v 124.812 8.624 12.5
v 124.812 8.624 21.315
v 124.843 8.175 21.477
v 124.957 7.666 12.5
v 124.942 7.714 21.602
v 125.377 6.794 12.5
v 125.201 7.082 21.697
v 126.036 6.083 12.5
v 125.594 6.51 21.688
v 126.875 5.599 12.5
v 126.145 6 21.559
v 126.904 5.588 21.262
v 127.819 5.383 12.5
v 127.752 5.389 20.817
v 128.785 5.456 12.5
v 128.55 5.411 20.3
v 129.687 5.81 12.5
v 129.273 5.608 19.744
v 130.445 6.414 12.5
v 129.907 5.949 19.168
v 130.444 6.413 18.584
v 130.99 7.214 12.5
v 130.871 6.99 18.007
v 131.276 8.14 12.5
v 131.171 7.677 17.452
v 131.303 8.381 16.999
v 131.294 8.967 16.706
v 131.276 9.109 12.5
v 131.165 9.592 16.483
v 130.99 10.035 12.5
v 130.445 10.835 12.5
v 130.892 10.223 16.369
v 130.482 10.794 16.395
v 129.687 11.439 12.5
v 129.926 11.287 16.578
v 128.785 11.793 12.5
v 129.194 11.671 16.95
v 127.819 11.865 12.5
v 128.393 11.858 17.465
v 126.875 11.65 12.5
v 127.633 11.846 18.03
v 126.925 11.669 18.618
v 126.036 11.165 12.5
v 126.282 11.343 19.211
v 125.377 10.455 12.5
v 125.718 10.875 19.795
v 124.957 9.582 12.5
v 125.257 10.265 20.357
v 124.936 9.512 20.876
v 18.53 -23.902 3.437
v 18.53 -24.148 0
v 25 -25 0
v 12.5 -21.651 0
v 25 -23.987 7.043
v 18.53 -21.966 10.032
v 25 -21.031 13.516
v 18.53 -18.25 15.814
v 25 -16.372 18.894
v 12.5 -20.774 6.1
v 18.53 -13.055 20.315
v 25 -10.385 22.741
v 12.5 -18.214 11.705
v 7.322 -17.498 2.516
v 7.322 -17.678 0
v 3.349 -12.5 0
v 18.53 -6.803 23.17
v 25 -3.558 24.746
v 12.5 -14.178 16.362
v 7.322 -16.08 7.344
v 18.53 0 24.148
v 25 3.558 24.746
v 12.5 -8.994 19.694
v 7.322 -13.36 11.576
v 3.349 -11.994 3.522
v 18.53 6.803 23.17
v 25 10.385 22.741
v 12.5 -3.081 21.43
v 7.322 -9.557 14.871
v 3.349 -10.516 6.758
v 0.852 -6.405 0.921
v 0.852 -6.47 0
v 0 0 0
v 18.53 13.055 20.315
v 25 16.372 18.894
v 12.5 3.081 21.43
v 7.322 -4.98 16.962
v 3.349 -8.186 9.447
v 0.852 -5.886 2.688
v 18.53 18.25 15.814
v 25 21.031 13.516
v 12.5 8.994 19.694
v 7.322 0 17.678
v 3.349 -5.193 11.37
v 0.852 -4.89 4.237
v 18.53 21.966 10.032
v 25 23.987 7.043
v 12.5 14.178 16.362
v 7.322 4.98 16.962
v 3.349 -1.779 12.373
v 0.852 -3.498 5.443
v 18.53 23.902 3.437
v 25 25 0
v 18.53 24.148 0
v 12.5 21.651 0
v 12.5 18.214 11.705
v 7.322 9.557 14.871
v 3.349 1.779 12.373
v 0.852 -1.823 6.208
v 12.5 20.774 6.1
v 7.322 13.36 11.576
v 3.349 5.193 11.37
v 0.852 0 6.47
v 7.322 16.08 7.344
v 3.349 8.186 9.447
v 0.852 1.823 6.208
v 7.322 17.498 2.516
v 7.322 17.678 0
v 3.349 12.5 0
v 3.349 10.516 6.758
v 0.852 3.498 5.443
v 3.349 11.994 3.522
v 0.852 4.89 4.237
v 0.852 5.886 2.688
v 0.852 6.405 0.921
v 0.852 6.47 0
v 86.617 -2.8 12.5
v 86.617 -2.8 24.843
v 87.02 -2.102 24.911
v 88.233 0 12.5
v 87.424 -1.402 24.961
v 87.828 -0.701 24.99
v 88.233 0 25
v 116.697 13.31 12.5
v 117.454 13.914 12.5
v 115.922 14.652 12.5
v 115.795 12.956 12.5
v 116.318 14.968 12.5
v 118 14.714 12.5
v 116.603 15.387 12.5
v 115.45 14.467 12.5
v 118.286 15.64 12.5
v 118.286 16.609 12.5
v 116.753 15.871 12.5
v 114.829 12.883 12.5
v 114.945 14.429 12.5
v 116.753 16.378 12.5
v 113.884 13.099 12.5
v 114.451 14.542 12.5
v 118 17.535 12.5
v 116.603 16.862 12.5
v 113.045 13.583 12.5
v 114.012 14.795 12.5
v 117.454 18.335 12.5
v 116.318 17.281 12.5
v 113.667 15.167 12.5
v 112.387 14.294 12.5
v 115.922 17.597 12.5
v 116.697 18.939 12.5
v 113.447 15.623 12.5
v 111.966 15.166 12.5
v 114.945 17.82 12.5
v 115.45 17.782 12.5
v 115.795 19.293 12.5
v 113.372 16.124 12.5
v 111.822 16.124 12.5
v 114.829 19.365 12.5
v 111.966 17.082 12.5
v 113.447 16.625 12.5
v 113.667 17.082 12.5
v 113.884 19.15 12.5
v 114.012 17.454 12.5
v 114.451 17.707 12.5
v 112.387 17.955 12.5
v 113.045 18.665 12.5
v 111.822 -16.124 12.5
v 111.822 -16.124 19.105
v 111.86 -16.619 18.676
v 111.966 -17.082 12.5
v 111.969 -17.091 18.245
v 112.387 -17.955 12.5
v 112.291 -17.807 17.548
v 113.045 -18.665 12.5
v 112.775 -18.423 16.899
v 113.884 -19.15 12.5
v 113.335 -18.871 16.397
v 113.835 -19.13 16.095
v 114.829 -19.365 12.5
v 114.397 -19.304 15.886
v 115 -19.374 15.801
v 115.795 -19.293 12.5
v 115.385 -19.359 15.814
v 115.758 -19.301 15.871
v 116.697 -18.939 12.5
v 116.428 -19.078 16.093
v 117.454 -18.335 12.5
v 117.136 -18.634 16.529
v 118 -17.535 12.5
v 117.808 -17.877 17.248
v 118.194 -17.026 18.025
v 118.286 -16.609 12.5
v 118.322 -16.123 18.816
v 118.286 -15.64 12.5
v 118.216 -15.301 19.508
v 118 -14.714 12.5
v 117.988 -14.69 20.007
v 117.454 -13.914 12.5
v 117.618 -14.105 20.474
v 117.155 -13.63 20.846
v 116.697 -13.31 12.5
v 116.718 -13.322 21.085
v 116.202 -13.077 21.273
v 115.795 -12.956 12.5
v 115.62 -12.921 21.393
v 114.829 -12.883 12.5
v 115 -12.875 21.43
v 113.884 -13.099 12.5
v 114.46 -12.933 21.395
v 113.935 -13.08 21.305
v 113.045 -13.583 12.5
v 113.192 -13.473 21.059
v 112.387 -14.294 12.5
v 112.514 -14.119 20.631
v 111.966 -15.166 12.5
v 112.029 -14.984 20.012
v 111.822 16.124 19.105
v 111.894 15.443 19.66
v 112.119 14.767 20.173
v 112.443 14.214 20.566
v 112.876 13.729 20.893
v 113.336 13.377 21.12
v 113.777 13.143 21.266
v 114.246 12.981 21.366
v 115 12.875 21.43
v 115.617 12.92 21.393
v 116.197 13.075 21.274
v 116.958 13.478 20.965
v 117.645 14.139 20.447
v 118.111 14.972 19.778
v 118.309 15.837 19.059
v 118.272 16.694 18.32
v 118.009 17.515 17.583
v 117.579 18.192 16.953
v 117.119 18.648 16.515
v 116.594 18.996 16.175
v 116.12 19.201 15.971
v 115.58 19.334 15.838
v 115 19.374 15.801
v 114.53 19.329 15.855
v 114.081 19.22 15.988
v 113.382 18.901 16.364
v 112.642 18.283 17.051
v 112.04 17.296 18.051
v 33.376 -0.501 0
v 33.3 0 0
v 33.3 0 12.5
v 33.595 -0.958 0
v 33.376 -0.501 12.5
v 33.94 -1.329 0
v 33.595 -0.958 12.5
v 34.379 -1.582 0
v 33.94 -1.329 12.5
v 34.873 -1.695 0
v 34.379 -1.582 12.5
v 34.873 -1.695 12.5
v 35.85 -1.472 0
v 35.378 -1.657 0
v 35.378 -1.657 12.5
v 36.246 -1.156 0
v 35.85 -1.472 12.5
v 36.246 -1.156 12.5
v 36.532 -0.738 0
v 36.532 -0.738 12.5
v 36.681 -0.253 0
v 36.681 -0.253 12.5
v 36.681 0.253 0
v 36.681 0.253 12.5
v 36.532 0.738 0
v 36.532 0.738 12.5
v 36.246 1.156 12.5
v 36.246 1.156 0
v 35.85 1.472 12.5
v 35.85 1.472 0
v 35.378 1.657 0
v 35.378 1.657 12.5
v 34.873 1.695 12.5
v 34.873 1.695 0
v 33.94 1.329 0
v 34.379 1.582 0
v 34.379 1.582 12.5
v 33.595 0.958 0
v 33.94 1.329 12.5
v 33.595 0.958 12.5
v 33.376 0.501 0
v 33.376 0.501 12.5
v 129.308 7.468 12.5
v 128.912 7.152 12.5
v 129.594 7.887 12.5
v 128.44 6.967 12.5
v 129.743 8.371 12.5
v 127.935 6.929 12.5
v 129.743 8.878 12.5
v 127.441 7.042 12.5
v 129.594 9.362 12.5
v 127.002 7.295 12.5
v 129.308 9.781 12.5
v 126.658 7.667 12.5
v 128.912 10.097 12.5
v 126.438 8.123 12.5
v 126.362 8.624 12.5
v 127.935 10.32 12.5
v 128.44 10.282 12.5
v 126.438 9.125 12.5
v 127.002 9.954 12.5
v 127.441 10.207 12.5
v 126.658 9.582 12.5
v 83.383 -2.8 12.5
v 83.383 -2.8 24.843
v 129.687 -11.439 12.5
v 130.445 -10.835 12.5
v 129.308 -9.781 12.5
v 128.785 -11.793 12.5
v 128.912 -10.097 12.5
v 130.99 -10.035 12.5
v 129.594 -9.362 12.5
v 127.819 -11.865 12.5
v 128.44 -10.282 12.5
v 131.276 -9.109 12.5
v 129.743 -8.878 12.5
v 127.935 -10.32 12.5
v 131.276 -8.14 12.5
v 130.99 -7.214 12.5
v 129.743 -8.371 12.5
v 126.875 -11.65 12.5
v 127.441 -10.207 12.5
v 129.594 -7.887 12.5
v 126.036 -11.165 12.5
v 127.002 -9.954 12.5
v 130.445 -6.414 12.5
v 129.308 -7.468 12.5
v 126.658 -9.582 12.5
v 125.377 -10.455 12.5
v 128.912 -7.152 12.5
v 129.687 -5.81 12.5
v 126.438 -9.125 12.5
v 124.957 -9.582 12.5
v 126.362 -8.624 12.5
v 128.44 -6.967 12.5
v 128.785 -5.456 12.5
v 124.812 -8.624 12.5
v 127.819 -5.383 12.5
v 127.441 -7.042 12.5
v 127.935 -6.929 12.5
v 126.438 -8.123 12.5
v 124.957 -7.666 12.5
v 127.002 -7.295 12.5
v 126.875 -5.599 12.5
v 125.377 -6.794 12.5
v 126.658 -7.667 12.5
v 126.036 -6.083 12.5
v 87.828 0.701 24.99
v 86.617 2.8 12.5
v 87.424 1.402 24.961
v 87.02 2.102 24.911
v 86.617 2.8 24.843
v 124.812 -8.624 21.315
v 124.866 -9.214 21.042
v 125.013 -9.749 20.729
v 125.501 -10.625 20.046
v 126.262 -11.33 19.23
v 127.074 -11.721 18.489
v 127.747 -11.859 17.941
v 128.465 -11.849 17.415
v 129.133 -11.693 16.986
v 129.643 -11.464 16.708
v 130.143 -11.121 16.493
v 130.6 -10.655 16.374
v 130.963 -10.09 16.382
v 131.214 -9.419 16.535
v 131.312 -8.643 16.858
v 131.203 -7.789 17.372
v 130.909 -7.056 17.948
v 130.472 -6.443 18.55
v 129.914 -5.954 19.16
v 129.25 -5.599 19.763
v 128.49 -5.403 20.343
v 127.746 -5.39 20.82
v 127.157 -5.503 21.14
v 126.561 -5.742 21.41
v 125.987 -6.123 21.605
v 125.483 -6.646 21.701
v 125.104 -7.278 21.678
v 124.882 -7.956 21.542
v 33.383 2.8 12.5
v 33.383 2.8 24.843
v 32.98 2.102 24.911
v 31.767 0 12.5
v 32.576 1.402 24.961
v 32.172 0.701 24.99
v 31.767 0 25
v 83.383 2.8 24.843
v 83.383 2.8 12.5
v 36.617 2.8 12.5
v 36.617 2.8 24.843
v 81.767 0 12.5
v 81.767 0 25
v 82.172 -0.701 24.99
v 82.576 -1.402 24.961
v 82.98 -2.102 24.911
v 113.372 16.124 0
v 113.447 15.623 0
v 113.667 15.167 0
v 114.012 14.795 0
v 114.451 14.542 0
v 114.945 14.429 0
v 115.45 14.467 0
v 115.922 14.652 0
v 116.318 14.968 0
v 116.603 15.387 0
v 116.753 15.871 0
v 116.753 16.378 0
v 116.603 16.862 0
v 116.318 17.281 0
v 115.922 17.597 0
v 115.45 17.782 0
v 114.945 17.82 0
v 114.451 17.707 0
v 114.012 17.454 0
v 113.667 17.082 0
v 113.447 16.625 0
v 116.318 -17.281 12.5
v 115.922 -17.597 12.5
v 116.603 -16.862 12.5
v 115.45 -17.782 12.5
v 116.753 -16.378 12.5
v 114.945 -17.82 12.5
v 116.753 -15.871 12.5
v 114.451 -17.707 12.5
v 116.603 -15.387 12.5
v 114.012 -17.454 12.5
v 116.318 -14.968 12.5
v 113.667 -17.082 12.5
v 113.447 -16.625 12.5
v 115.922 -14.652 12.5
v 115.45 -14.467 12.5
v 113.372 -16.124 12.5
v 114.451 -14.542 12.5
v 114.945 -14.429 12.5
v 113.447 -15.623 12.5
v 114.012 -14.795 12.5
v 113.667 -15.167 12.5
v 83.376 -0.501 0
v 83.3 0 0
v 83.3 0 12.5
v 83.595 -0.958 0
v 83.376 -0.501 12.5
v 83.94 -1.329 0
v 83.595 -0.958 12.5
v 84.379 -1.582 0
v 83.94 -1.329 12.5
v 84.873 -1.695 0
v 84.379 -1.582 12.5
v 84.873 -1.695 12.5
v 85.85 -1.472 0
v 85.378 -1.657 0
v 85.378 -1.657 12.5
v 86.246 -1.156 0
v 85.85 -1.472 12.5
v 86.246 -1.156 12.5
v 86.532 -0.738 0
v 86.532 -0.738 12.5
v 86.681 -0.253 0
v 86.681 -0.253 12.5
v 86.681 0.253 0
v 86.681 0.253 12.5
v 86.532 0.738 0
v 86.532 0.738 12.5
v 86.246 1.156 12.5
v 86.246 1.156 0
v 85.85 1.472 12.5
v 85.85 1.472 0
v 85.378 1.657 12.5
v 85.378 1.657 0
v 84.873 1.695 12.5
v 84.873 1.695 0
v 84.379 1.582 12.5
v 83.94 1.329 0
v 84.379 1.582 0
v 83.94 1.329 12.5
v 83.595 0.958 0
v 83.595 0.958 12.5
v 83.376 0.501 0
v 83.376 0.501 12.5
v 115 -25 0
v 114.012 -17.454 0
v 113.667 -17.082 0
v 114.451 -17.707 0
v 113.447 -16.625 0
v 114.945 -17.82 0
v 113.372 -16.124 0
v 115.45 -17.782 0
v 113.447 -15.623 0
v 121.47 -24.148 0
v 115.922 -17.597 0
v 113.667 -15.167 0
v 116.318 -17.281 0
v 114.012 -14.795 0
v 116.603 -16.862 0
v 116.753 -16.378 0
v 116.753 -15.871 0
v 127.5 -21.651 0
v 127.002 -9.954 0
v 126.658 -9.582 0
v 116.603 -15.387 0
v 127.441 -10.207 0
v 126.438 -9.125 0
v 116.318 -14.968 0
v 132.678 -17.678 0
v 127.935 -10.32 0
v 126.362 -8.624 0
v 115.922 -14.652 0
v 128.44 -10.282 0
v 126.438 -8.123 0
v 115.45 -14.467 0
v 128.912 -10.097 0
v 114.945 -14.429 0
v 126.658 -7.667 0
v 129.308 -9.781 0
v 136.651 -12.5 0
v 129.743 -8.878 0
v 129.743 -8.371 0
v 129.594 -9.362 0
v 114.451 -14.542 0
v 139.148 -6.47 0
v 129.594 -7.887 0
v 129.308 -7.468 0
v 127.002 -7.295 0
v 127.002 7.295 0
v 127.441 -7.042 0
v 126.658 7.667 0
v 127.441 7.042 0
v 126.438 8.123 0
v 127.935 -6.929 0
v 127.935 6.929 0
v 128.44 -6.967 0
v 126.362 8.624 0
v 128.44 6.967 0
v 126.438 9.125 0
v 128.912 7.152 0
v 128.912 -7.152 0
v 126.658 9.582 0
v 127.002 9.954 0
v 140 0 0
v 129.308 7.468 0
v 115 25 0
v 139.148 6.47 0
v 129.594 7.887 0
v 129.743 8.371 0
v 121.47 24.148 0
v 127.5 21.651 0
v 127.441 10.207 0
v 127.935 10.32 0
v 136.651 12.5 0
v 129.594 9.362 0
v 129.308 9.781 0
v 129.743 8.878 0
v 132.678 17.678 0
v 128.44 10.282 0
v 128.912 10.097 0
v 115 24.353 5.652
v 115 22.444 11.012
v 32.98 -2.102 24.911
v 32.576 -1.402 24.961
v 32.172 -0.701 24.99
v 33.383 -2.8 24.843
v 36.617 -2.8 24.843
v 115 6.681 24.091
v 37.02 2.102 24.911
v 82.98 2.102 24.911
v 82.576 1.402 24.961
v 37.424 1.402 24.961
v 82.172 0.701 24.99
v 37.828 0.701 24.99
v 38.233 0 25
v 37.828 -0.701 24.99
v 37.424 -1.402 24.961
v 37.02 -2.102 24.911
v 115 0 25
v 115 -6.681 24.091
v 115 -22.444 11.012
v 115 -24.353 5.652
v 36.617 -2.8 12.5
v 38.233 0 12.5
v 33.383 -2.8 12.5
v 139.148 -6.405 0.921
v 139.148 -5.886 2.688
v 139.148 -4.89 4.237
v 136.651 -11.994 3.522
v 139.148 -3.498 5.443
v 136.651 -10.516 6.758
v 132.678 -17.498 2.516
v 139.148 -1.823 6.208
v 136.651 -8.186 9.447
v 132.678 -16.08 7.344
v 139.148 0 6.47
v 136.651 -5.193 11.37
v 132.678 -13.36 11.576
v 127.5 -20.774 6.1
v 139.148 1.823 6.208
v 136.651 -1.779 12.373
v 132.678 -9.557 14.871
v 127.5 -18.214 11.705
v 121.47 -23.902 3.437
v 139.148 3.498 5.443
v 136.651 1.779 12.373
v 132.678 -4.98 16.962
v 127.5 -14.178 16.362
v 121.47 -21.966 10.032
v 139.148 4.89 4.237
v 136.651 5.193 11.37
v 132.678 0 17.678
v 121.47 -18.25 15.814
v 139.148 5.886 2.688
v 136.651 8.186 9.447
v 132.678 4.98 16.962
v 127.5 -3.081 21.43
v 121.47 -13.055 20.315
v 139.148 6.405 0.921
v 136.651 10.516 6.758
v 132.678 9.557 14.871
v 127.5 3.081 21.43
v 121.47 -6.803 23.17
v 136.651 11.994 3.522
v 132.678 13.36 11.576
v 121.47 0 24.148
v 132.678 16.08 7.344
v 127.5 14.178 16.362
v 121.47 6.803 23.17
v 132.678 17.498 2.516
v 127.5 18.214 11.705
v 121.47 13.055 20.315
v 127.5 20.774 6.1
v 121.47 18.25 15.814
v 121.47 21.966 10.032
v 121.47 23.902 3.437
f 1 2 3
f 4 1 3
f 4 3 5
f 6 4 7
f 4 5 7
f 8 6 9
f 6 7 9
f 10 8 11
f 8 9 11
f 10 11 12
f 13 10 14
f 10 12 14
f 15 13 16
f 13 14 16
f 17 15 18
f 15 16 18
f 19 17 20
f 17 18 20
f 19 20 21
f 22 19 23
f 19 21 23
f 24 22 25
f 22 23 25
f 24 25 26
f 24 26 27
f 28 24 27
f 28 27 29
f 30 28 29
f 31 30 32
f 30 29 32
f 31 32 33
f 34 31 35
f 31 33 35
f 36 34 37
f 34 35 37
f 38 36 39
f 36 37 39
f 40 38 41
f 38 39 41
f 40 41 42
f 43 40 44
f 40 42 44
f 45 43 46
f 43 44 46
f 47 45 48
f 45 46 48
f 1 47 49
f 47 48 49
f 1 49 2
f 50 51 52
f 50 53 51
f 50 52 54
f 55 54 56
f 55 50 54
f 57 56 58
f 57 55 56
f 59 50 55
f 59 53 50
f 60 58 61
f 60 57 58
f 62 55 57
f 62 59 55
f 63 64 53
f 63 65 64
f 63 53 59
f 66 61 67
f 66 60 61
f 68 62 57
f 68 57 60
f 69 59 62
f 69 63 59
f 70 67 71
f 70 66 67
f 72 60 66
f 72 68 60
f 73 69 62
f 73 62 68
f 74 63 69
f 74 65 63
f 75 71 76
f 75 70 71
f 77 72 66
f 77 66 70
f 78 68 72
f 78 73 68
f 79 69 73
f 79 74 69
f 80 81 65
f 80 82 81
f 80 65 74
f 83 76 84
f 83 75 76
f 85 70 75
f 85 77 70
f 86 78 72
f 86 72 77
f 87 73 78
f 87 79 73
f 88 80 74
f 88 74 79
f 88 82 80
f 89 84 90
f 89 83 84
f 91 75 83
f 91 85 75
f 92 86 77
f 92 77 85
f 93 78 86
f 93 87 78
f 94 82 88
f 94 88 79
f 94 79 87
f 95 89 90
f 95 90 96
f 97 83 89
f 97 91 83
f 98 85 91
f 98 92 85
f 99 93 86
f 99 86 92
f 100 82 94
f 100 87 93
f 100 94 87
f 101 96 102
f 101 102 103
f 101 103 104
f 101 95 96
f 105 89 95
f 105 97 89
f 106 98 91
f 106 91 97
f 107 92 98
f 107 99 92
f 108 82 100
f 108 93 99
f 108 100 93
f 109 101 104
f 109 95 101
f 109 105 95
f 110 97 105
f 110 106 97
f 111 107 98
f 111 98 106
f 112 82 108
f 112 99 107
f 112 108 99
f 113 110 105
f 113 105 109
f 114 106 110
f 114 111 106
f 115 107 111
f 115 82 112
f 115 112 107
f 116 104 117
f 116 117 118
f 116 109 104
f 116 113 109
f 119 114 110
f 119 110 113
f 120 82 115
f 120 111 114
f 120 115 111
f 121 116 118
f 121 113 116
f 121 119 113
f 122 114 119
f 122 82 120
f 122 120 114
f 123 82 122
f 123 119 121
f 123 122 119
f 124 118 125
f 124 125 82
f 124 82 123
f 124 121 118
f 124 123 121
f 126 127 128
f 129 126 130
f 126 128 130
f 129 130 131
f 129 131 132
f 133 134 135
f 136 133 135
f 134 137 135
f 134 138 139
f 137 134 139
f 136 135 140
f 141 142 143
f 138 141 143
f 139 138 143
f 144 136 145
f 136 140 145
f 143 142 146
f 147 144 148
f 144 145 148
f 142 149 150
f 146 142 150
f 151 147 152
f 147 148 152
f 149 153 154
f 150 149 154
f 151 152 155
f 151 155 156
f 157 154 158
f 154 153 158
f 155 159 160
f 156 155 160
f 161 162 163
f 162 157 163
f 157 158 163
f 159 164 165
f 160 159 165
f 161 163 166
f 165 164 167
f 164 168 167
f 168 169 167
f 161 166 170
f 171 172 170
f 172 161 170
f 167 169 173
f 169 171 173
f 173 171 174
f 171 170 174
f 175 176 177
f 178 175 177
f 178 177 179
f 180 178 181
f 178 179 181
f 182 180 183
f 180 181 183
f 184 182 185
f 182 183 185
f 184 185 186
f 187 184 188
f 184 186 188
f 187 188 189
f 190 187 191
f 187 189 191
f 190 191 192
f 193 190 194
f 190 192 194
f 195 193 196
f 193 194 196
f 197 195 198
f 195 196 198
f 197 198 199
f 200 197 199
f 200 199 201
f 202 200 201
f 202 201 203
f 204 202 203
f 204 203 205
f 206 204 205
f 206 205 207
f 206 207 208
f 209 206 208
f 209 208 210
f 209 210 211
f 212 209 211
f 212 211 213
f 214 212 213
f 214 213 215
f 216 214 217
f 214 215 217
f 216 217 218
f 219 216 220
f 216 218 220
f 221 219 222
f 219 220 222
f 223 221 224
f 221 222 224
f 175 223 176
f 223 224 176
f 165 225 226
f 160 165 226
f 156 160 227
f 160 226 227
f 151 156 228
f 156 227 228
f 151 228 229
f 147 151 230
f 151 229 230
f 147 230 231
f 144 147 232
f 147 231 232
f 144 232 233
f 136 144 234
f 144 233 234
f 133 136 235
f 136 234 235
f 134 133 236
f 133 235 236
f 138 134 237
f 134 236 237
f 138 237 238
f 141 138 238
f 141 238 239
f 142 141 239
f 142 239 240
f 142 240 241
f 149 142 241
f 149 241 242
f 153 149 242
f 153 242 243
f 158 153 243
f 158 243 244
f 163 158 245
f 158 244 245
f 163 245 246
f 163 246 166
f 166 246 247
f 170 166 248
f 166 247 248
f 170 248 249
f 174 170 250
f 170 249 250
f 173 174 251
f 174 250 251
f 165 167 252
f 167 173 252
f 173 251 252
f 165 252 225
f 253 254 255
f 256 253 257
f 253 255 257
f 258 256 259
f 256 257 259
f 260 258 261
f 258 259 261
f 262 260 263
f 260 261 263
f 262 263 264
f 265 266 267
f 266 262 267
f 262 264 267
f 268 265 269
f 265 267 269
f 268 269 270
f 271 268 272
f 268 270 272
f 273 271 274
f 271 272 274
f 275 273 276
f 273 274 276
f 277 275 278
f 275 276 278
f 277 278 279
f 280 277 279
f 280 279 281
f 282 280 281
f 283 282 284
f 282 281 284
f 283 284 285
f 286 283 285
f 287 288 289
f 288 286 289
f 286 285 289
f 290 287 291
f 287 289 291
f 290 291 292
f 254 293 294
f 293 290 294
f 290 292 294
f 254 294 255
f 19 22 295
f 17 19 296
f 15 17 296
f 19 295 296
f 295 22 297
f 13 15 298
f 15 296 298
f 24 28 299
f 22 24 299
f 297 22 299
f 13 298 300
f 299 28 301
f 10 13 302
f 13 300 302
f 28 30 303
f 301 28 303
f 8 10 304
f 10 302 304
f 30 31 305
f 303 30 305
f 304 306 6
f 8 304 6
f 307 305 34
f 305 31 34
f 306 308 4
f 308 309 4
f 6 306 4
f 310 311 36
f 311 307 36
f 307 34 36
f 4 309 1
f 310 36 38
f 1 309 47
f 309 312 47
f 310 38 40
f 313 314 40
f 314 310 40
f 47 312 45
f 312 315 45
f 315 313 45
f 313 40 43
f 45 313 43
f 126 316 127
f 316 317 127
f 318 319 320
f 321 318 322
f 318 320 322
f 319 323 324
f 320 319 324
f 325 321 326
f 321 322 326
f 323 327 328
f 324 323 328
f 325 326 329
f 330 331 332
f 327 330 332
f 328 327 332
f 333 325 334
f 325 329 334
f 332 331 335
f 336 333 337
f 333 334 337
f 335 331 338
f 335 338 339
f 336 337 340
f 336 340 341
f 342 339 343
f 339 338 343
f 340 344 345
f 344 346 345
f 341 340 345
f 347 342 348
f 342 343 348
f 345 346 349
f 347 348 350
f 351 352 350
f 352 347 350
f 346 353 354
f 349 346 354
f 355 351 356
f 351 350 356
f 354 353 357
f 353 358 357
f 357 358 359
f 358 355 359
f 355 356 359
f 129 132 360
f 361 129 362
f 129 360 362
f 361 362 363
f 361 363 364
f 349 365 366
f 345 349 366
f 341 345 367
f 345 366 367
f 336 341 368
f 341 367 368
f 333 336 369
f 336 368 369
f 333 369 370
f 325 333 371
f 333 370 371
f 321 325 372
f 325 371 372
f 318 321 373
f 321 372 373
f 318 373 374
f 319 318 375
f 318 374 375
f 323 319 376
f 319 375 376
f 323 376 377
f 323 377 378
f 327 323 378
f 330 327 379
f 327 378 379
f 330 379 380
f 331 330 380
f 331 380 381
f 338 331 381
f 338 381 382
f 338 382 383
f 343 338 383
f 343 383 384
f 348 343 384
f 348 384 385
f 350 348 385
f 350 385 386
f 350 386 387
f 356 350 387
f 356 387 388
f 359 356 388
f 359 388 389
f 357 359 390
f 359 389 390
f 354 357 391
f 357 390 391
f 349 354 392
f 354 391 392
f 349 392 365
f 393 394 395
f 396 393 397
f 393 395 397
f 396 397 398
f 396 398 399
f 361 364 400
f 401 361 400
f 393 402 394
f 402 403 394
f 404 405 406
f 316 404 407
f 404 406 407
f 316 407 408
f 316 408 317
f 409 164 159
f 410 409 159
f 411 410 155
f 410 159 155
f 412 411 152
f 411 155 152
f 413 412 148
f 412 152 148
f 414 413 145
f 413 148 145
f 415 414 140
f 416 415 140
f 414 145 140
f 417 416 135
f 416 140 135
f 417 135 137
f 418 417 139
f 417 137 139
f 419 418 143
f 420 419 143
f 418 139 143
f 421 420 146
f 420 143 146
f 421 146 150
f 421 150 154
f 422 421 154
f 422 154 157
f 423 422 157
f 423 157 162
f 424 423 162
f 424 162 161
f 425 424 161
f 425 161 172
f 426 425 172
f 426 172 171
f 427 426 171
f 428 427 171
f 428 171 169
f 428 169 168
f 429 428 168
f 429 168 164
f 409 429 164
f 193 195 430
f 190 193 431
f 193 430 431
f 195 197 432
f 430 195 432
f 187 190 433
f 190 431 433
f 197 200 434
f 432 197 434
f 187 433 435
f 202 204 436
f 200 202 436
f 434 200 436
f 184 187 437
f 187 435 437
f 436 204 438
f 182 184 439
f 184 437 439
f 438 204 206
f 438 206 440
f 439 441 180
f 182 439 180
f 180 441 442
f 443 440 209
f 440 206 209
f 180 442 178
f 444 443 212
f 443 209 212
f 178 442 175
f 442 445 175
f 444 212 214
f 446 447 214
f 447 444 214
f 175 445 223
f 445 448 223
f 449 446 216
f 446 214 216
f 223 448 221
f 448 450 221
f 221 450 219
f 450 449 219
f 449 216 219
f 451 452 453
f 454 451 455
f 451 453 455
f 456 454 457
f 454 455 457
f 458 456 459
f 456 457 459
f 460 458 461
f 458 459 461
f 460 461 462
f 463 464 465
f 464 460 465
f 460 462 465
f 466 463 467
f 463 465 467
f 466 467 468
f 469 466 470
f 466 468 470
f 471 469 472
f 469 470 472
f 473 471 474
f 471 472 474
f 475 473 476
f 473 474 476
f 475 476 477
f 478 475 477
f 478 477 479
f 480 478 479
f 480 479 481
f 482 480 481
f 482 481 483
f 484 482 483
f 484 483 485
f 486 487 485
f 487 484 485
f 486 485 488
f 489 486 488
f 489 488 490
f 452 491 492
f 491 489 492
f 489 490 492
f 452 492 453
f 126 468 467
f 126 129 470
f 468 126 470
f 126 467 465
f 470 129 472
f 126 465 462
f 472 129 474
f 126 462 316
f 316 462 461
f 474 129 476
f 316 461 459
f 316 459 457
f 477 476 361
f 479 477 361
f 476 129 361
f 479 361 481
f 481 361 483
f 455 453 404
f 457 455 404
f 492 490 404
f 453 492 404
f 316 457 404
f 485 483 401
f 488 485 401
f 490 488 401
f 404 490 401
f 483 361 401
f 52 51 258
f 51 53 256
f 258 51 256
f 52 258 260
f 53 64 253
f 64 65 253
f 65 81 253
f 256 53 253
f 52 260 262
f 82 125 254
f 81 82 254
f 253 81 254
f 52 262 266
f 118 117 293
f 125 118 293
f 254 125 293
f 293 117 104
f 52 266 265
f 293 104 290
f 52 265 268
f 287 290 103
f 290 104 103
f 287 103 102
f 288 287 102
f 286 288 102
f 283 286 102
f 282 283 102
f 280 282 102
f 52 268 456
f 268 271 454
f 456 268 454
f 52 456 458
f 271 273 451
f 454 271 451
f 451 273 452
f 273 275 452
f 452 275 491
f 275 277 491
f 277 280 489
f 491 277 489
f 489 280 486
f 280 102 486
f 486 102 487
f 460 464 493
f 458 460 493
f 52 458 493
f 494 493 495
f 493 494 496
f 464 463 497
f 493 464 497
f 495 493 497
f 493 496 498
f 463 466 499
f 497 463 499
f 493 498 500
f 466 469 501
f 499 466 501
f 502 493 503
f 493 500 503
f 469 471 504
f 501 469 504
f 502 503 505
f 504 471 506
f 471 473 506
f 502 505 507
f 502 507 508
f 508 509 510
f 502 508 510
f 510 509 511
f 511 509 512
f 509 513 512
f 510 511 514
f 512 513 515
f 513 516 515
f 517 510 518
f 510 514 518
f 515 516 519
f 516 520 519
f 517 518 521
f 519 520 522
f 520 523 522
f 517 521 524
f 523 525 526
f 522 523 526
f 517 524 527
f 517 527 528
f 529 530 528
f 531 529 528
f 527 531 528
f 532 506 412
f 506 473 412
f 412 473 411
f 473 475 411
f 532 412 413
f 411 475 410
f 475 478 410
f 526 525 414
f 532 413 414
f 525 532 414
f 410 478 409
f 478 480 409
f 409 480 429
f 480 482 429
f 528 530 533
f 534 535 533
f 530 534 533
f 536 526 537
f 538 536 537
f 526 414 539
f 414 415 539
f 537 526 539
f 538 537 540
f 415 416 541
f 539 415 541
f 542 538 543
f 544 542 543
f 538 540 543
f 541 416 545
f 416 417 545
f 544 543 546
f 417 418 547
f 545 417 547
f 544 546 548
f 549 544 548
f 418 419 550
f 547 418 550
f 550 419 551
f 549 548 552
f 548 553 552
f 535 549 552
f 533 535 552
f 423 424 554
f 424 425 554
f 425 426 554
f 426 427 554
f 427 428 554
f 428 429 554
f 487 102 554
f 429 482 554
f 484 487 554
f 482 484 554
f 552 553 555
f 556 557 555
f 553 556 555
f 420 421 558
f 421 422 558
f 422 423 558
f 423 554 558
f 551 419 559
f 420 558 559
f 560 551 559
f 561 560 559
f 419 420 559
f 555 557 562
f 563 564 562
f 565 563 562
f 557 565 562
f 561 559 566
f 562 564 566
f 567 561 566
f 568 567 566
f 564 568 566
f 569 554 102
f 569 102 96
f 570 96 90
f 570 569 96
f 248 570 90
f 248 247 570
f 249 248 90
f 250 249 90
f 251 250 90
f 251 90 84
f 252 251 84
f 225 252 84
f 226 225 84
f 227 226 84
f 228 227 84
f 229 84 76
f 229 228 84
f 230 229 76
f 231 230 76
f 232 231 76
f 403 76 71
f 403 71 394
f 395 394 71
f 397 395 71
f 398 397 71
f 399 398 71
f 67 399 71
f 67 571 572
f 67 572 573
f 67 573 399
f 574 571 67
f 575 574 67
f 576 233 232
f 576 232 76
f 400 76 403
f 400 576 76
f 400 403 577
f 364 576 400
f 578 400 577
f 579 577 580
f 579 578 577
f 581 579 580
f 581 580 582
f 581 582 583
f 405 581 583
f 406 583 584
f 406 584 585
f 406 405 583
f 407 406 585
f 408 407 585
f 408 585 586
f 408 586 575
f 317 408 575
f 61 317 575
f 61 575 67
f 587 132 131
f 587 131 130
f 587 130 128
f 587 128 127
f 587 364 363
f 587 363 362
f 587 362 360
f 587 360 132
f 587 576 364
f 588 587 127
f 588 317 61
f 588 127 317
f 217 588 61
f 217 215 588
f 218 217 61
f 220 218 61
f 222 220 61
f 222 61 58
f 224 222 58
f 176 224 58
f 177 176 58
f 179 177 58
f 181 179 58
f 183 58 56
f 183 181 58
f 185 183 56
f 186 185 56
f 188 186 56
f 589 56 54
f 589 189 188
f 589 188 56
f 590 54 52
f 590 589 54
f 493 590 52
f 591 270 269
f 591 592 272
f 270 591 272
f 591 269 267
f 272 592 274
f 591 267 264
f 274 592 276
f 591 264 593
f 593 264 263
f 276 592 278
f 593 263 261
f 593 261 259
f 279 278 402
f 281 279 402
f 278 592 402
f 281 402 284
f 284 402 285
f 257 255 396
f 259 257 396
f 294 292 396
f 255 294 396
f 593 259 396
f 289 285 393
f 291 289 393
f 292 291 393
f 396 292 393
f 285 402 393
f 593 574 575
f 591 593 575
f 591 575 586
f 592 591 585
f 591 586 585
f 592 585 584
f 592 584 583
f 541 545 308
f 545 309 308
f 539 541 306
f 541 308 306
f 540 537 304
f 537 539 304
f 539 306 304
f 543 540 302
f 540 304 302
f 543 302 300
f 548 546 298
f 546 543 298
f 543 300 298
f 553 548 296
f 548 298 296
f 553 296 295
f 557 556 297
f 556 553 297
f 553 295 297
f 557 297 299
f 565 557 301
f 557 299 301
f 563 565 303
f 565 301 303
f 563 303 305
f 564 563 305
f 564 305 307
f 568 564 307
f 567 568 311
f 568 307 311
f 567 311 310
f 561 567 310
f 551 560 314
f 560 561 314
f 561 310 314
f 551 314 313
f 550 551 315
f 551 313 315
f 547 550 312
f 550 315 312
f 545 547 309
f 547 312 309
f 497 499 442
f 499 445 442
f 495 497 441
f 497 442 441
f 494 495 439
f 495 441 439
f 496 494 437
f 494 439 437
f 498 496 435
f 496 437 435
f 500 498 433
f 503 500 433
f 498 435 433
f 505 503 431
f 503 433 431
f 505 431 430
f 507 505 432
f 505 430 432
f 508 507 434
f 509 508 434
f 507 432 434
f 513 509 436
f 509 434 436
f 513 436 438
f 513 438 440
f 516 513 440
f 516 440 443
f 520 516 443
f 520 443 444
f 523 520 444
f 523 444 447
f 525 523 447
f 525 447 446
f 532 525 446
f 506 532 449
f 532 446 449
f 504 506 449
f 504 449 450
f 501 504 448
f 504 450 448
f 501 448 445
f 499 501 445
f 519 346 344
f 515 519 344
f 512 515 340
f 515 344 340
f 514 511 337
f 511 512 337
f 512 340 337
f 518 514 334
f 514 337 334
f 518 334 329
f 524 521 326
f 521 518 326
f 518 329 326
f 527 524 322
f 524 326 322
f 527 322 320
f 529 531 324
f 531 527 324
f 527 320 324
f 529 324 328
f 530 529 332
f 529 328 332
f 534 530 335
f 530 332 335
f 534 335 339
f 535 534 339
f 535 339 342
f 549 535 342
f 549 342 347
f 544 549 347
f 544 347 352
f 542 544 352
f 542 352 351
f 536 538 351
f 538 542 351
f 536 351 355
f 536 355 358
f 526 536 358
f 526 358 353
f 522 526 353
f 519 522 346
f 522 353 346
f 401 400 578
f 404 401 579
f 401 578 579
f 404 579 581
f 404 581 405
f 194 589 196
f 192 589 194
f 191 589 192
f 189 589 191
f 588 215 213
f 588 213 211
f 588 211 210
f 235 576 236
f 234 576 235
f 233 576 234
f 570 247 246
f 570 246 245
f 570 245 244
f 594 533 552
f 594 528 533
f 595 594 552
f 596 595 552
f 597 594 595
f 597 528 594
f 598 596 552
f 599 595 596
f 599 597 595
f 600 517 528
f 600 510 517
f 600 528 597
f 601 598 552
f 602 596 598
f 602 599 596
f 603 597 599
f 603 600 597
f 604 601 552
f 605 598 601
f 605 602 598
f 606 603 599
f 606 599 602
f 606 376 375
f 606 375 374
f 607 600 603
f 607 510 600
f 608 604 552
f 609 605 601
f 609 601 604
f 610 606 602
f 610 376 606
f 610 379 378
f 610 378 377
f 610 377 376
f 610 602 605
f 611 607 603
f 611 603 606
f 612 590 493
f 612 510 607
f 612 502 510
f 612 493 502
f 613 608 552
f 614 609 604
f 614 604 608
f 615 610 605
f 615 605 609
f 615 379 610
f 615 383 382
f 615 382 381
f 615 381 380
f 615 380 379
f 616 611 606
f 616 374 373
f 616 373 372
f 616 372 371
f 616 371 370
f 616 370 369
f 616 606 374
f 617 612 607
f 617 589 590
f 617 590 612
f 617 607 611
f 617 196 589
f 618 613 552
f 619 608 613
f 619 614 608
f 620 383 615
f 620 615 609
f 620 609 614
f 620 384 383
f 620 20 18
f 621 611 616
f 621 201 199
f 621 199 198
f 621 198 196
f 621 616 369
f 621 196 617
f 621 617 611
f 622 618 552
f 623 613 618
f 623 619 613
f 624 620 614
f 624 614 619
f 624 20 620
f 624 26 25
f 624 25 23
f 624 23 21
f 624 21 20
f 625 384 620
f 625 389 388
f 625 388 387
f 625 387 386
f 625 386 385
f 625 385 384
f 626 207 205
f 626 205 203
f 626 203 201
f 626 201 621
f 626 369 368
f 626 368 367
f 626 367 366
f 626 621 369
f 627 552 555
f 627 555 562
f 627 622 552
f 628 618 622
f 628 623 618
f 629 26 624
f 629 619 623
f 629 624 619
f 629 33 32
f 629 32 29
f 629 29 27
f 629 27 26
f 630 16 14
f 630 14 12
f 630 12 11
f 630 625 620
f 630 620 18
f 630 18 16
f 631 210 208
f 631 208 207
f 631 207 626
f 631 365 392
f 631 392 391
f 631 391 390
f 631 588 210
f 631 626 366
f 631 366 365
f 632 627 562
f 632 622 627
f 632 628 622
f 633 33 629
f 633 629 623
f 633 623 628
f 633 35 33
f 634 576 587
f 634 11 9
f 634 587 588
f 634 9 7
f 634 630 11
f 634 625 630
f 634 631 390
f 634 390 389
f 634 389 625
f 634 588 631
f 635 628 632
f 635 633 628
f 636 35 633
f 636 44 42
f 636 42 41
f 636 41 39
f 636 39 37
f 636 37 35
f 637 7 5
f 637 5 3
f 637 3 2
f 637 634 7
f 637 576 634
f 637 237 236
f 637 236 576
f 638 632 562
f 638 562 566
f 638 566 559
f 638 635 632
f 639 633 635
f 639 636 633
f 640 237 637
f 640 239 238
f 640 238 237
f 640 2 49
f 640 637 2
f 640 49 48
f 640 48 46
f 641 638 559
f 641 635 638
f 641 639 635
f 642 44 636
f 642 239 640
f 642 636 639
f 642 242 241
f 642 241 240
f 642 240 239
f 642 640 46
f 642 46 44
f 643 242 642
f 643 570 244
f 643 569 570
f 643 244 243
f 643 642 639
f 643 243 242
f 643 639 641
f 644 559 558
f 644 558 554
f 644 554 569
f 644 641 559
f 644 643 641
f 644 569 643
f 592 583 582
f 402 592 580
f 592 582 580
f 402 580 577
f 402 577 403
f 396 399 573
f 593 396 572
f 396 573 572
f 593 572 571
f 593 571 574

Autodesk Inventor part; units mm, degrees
ref_plane "Plan YZ" through (0, 0, 0) normal (1, 0, 0) x (0, 1, 0)
ref_plane "Plan XZ" through (0, 0, 0) normal (0, 1, 0) x (-1, 0, 0)
sketch "Esquisse1" plane through (0, 0, 0) normal (0, 0, 1) x (1, 0, 0)
  arc A0 (25, 25) -> (0, 0) centre (25, 0) ccw
  line L0 (25, 25) -> (115, 25)
  arc A1 (140, 0) -> (115, 25) centre (115, 0) ccw
  line L1 (0, 0) -> (140, 0)
  dimension "d0" = 90
  dimension "d1" = 25
revolve "Révolution1" add sketch "Esquisse1" angle 180 about axis through (0, 0, 0) along (1, 0, 0)
ref_plane "Plan de construction1" through (115, 25, 25) normal (0, 0, -1) x (-1, 0, 0)
sketch "Esquisse6" plane through (115, 25, 25) normal (0, 0, -1) x (-1, 0, 0)
  line L0 (76.7668, -25) -> (78.3834, -22.2)
  line L1 (78.3834, -22.2) -> (81.6166, -22.2)
  line L2 (81.6166, -22.2) -> (83.2332, -25)
  line L3 (83.2332, -25) -> (81.6166, -27.8)
  line L4 (81.6166, -27.8) -> (78.3834, -27.8)
  line L5 (78.3834, -27.8) -> (76.7668, -25)
  line L6 (90, 0) -> (90, -50) projected
  line L7 (26.7668, -25) -> (28.3834, -22.2)
  line L8 (28.3834, -22.2) -> (31.6166, -22.2)
  line L9 (31.6166, -22.2) -> (33.2332, -25)
  line L10 (33.2332, -25) -> (31.6166, -27.8)
  line L11 (31.6166, -27.8) -> (28.3834, -27.8)
  line L12 (28.3834, -27.8) -> (26.7668, -25)
  line L13 (30, -25) -> (26.7668, -25) construction
  line L14 (90, -25) -> (19.1163, -25) construction
  line L15 (80, -25) -> (76.7668, -25) construction
  point P0 (115, -25)
  dimension "d4" = 5.6
  dimension "d5" = 10
  dimension "d6" = 50
  dimension "d7" = 5.6
extrude "Extrusion1" cut sketch "Esquisse6" along normal blind 12.5
sketch "Esquisse7" plane through (115, 25, 25) normal (0, 0, -1) x (-1, 0, 0)
  circle A0 centre (80, -25) radius 3.2332 construction
  circle A1 centre (30, -25) radius 3.2332 construction
  circle A2 centre (80, -25) radius 1.7
  circle A3 centre (30, -25) radius 1.7
  point P0 (115, -25)
  point P1 (78.3834, -22.2)
  point P2 (28.3834, -22.2)
  point P3 (31.6166, -27.8)
  point P4 (28.3834, -27.8)
  point P5 (81.6166, -27.8)
  point P6 (78.3834, -27.8)
  dimension "d10" = 3.4
  dimension "d11" = 3.4
extrude "Extrusion2" cut sketch "Esquisse7" along normal blind 25
sketch "Esquisse8" plane through (115, 25, 25) normal (0, 0, -1) x (-1, 0, 0)
  line L0 (0.0645, -24.9628) -> (43.3013, 0) construction
  line L1 (43.3013, 0) -> (30.8013, 21.6506) construction
  line L2 (30.8013, 21.6506) -> (-34.1506, -15.8494) construction
  line L3 (-34.1506, -15.8494) -> (-21.6506, -37.5) construction
  line L4 (-21.6506, -37.5) -> (0.0645, -24.9628) construction
  arc A0 (0, 0) -> (0, -50) centre (0, -25) ccw projected
  line L5 (0, 0) -> (0, -50) projected
  line L6 (90, 0) -> (0, 0) projected
  line L7 (-0.0718, -8.8756) -> (-13.0622, -16.3756) construction
  circle A1 centre (-0.0718, -8.8756) radius 1.7
  circle A2 centre (-13.0622, -16.3756) radius 1.7
  line L8 (81.6277, 0) -> (81.6277, -25) construction
  line L9 (81.6277, -25) -> (81.6277, -50) construction
  line L10 (81.6277, -25) -> (44.865, -25) construction
  line L11 (0, -50) -> (90, -50) construction
  line L12 (-34.1506, -34.1506) -> (-21.6506, -12.5) construction
  line L13 (-21.6506, -12.5) -> (0.0645, -25.0372) construction
  arc A3 (0, 0) -> (0, -50) centre (0, -25) ccw
  line L14 (0, -50) -> (0, 0)
  line L15 (-0.0718, -41.1244) -> (-13.0622, -33.6244) construction
  circle A4 centre (-0.0718, -41.1244) radius 1.7
  circle A5 centre (-13.0622, -33.6244) radius 1.7
  point P0 (115, -25)
  dimension "d14" = 60
  dimension "d15" = 14
  dimension "d16" = 18
  dimension "d17" = 33
  dimension "d18" = 3.4
  dimension "d19" = 3.4
extrude "Extrusion3" cut sketch "Esquisse8" along normal blind 25 contours A1 L5 | L5 A1 | A4 L5 | L5 A4 | A2 | A5
sketch "Esquisse9" plane through (115, 25, 25) normal (0, 0, -1) x (-1, 0, 0)
  circle A0 centre (-0.0718, -8.8756) radius 3.25
  circle A1 centre (-13.0622, -16.3756) radius 3.25
  circle A2 centre (-0.0718, -8.8756) radius 1.7 projected
  circle A3 centre (-13.0622, -16.3756) radius 1.7 projected
  line L0 (65.6358, 0) -> (65.6358, -25) construction
  line L1 (65.6358, -25) -> (65.6358, -50) construction
  line L2 (65.6358, -25) -> (25.9635, -25) construction
  line L3 (90, 0) -> (0, 0) construction
  line L4 (0, -50) -> (90, -50) construction
  circle A4 centre (-0.0718, -41.1244) radius 3.25
  circle A5 centre (-13.0622, -33.6244) radius 3.25
  circle A6 centre (-0.0718, -41.1244) radius 1.7
  circle A7 centre (-13.0622, -33.6244) radius 1.7
  point P0 (115, -25)
  dimension "d22" = 6.5
  dimension "d23" = 6.5
extrude "Extrusion4" cut sketch "Esquisse9" along normal blind 12.5
equation "\"d7\" = d4"
equation "\"d11\" = d10"
equation "\"d19\" = d18"
equation "\"d23\" = d22"
properties part number "P1704_004" material "PLA"
